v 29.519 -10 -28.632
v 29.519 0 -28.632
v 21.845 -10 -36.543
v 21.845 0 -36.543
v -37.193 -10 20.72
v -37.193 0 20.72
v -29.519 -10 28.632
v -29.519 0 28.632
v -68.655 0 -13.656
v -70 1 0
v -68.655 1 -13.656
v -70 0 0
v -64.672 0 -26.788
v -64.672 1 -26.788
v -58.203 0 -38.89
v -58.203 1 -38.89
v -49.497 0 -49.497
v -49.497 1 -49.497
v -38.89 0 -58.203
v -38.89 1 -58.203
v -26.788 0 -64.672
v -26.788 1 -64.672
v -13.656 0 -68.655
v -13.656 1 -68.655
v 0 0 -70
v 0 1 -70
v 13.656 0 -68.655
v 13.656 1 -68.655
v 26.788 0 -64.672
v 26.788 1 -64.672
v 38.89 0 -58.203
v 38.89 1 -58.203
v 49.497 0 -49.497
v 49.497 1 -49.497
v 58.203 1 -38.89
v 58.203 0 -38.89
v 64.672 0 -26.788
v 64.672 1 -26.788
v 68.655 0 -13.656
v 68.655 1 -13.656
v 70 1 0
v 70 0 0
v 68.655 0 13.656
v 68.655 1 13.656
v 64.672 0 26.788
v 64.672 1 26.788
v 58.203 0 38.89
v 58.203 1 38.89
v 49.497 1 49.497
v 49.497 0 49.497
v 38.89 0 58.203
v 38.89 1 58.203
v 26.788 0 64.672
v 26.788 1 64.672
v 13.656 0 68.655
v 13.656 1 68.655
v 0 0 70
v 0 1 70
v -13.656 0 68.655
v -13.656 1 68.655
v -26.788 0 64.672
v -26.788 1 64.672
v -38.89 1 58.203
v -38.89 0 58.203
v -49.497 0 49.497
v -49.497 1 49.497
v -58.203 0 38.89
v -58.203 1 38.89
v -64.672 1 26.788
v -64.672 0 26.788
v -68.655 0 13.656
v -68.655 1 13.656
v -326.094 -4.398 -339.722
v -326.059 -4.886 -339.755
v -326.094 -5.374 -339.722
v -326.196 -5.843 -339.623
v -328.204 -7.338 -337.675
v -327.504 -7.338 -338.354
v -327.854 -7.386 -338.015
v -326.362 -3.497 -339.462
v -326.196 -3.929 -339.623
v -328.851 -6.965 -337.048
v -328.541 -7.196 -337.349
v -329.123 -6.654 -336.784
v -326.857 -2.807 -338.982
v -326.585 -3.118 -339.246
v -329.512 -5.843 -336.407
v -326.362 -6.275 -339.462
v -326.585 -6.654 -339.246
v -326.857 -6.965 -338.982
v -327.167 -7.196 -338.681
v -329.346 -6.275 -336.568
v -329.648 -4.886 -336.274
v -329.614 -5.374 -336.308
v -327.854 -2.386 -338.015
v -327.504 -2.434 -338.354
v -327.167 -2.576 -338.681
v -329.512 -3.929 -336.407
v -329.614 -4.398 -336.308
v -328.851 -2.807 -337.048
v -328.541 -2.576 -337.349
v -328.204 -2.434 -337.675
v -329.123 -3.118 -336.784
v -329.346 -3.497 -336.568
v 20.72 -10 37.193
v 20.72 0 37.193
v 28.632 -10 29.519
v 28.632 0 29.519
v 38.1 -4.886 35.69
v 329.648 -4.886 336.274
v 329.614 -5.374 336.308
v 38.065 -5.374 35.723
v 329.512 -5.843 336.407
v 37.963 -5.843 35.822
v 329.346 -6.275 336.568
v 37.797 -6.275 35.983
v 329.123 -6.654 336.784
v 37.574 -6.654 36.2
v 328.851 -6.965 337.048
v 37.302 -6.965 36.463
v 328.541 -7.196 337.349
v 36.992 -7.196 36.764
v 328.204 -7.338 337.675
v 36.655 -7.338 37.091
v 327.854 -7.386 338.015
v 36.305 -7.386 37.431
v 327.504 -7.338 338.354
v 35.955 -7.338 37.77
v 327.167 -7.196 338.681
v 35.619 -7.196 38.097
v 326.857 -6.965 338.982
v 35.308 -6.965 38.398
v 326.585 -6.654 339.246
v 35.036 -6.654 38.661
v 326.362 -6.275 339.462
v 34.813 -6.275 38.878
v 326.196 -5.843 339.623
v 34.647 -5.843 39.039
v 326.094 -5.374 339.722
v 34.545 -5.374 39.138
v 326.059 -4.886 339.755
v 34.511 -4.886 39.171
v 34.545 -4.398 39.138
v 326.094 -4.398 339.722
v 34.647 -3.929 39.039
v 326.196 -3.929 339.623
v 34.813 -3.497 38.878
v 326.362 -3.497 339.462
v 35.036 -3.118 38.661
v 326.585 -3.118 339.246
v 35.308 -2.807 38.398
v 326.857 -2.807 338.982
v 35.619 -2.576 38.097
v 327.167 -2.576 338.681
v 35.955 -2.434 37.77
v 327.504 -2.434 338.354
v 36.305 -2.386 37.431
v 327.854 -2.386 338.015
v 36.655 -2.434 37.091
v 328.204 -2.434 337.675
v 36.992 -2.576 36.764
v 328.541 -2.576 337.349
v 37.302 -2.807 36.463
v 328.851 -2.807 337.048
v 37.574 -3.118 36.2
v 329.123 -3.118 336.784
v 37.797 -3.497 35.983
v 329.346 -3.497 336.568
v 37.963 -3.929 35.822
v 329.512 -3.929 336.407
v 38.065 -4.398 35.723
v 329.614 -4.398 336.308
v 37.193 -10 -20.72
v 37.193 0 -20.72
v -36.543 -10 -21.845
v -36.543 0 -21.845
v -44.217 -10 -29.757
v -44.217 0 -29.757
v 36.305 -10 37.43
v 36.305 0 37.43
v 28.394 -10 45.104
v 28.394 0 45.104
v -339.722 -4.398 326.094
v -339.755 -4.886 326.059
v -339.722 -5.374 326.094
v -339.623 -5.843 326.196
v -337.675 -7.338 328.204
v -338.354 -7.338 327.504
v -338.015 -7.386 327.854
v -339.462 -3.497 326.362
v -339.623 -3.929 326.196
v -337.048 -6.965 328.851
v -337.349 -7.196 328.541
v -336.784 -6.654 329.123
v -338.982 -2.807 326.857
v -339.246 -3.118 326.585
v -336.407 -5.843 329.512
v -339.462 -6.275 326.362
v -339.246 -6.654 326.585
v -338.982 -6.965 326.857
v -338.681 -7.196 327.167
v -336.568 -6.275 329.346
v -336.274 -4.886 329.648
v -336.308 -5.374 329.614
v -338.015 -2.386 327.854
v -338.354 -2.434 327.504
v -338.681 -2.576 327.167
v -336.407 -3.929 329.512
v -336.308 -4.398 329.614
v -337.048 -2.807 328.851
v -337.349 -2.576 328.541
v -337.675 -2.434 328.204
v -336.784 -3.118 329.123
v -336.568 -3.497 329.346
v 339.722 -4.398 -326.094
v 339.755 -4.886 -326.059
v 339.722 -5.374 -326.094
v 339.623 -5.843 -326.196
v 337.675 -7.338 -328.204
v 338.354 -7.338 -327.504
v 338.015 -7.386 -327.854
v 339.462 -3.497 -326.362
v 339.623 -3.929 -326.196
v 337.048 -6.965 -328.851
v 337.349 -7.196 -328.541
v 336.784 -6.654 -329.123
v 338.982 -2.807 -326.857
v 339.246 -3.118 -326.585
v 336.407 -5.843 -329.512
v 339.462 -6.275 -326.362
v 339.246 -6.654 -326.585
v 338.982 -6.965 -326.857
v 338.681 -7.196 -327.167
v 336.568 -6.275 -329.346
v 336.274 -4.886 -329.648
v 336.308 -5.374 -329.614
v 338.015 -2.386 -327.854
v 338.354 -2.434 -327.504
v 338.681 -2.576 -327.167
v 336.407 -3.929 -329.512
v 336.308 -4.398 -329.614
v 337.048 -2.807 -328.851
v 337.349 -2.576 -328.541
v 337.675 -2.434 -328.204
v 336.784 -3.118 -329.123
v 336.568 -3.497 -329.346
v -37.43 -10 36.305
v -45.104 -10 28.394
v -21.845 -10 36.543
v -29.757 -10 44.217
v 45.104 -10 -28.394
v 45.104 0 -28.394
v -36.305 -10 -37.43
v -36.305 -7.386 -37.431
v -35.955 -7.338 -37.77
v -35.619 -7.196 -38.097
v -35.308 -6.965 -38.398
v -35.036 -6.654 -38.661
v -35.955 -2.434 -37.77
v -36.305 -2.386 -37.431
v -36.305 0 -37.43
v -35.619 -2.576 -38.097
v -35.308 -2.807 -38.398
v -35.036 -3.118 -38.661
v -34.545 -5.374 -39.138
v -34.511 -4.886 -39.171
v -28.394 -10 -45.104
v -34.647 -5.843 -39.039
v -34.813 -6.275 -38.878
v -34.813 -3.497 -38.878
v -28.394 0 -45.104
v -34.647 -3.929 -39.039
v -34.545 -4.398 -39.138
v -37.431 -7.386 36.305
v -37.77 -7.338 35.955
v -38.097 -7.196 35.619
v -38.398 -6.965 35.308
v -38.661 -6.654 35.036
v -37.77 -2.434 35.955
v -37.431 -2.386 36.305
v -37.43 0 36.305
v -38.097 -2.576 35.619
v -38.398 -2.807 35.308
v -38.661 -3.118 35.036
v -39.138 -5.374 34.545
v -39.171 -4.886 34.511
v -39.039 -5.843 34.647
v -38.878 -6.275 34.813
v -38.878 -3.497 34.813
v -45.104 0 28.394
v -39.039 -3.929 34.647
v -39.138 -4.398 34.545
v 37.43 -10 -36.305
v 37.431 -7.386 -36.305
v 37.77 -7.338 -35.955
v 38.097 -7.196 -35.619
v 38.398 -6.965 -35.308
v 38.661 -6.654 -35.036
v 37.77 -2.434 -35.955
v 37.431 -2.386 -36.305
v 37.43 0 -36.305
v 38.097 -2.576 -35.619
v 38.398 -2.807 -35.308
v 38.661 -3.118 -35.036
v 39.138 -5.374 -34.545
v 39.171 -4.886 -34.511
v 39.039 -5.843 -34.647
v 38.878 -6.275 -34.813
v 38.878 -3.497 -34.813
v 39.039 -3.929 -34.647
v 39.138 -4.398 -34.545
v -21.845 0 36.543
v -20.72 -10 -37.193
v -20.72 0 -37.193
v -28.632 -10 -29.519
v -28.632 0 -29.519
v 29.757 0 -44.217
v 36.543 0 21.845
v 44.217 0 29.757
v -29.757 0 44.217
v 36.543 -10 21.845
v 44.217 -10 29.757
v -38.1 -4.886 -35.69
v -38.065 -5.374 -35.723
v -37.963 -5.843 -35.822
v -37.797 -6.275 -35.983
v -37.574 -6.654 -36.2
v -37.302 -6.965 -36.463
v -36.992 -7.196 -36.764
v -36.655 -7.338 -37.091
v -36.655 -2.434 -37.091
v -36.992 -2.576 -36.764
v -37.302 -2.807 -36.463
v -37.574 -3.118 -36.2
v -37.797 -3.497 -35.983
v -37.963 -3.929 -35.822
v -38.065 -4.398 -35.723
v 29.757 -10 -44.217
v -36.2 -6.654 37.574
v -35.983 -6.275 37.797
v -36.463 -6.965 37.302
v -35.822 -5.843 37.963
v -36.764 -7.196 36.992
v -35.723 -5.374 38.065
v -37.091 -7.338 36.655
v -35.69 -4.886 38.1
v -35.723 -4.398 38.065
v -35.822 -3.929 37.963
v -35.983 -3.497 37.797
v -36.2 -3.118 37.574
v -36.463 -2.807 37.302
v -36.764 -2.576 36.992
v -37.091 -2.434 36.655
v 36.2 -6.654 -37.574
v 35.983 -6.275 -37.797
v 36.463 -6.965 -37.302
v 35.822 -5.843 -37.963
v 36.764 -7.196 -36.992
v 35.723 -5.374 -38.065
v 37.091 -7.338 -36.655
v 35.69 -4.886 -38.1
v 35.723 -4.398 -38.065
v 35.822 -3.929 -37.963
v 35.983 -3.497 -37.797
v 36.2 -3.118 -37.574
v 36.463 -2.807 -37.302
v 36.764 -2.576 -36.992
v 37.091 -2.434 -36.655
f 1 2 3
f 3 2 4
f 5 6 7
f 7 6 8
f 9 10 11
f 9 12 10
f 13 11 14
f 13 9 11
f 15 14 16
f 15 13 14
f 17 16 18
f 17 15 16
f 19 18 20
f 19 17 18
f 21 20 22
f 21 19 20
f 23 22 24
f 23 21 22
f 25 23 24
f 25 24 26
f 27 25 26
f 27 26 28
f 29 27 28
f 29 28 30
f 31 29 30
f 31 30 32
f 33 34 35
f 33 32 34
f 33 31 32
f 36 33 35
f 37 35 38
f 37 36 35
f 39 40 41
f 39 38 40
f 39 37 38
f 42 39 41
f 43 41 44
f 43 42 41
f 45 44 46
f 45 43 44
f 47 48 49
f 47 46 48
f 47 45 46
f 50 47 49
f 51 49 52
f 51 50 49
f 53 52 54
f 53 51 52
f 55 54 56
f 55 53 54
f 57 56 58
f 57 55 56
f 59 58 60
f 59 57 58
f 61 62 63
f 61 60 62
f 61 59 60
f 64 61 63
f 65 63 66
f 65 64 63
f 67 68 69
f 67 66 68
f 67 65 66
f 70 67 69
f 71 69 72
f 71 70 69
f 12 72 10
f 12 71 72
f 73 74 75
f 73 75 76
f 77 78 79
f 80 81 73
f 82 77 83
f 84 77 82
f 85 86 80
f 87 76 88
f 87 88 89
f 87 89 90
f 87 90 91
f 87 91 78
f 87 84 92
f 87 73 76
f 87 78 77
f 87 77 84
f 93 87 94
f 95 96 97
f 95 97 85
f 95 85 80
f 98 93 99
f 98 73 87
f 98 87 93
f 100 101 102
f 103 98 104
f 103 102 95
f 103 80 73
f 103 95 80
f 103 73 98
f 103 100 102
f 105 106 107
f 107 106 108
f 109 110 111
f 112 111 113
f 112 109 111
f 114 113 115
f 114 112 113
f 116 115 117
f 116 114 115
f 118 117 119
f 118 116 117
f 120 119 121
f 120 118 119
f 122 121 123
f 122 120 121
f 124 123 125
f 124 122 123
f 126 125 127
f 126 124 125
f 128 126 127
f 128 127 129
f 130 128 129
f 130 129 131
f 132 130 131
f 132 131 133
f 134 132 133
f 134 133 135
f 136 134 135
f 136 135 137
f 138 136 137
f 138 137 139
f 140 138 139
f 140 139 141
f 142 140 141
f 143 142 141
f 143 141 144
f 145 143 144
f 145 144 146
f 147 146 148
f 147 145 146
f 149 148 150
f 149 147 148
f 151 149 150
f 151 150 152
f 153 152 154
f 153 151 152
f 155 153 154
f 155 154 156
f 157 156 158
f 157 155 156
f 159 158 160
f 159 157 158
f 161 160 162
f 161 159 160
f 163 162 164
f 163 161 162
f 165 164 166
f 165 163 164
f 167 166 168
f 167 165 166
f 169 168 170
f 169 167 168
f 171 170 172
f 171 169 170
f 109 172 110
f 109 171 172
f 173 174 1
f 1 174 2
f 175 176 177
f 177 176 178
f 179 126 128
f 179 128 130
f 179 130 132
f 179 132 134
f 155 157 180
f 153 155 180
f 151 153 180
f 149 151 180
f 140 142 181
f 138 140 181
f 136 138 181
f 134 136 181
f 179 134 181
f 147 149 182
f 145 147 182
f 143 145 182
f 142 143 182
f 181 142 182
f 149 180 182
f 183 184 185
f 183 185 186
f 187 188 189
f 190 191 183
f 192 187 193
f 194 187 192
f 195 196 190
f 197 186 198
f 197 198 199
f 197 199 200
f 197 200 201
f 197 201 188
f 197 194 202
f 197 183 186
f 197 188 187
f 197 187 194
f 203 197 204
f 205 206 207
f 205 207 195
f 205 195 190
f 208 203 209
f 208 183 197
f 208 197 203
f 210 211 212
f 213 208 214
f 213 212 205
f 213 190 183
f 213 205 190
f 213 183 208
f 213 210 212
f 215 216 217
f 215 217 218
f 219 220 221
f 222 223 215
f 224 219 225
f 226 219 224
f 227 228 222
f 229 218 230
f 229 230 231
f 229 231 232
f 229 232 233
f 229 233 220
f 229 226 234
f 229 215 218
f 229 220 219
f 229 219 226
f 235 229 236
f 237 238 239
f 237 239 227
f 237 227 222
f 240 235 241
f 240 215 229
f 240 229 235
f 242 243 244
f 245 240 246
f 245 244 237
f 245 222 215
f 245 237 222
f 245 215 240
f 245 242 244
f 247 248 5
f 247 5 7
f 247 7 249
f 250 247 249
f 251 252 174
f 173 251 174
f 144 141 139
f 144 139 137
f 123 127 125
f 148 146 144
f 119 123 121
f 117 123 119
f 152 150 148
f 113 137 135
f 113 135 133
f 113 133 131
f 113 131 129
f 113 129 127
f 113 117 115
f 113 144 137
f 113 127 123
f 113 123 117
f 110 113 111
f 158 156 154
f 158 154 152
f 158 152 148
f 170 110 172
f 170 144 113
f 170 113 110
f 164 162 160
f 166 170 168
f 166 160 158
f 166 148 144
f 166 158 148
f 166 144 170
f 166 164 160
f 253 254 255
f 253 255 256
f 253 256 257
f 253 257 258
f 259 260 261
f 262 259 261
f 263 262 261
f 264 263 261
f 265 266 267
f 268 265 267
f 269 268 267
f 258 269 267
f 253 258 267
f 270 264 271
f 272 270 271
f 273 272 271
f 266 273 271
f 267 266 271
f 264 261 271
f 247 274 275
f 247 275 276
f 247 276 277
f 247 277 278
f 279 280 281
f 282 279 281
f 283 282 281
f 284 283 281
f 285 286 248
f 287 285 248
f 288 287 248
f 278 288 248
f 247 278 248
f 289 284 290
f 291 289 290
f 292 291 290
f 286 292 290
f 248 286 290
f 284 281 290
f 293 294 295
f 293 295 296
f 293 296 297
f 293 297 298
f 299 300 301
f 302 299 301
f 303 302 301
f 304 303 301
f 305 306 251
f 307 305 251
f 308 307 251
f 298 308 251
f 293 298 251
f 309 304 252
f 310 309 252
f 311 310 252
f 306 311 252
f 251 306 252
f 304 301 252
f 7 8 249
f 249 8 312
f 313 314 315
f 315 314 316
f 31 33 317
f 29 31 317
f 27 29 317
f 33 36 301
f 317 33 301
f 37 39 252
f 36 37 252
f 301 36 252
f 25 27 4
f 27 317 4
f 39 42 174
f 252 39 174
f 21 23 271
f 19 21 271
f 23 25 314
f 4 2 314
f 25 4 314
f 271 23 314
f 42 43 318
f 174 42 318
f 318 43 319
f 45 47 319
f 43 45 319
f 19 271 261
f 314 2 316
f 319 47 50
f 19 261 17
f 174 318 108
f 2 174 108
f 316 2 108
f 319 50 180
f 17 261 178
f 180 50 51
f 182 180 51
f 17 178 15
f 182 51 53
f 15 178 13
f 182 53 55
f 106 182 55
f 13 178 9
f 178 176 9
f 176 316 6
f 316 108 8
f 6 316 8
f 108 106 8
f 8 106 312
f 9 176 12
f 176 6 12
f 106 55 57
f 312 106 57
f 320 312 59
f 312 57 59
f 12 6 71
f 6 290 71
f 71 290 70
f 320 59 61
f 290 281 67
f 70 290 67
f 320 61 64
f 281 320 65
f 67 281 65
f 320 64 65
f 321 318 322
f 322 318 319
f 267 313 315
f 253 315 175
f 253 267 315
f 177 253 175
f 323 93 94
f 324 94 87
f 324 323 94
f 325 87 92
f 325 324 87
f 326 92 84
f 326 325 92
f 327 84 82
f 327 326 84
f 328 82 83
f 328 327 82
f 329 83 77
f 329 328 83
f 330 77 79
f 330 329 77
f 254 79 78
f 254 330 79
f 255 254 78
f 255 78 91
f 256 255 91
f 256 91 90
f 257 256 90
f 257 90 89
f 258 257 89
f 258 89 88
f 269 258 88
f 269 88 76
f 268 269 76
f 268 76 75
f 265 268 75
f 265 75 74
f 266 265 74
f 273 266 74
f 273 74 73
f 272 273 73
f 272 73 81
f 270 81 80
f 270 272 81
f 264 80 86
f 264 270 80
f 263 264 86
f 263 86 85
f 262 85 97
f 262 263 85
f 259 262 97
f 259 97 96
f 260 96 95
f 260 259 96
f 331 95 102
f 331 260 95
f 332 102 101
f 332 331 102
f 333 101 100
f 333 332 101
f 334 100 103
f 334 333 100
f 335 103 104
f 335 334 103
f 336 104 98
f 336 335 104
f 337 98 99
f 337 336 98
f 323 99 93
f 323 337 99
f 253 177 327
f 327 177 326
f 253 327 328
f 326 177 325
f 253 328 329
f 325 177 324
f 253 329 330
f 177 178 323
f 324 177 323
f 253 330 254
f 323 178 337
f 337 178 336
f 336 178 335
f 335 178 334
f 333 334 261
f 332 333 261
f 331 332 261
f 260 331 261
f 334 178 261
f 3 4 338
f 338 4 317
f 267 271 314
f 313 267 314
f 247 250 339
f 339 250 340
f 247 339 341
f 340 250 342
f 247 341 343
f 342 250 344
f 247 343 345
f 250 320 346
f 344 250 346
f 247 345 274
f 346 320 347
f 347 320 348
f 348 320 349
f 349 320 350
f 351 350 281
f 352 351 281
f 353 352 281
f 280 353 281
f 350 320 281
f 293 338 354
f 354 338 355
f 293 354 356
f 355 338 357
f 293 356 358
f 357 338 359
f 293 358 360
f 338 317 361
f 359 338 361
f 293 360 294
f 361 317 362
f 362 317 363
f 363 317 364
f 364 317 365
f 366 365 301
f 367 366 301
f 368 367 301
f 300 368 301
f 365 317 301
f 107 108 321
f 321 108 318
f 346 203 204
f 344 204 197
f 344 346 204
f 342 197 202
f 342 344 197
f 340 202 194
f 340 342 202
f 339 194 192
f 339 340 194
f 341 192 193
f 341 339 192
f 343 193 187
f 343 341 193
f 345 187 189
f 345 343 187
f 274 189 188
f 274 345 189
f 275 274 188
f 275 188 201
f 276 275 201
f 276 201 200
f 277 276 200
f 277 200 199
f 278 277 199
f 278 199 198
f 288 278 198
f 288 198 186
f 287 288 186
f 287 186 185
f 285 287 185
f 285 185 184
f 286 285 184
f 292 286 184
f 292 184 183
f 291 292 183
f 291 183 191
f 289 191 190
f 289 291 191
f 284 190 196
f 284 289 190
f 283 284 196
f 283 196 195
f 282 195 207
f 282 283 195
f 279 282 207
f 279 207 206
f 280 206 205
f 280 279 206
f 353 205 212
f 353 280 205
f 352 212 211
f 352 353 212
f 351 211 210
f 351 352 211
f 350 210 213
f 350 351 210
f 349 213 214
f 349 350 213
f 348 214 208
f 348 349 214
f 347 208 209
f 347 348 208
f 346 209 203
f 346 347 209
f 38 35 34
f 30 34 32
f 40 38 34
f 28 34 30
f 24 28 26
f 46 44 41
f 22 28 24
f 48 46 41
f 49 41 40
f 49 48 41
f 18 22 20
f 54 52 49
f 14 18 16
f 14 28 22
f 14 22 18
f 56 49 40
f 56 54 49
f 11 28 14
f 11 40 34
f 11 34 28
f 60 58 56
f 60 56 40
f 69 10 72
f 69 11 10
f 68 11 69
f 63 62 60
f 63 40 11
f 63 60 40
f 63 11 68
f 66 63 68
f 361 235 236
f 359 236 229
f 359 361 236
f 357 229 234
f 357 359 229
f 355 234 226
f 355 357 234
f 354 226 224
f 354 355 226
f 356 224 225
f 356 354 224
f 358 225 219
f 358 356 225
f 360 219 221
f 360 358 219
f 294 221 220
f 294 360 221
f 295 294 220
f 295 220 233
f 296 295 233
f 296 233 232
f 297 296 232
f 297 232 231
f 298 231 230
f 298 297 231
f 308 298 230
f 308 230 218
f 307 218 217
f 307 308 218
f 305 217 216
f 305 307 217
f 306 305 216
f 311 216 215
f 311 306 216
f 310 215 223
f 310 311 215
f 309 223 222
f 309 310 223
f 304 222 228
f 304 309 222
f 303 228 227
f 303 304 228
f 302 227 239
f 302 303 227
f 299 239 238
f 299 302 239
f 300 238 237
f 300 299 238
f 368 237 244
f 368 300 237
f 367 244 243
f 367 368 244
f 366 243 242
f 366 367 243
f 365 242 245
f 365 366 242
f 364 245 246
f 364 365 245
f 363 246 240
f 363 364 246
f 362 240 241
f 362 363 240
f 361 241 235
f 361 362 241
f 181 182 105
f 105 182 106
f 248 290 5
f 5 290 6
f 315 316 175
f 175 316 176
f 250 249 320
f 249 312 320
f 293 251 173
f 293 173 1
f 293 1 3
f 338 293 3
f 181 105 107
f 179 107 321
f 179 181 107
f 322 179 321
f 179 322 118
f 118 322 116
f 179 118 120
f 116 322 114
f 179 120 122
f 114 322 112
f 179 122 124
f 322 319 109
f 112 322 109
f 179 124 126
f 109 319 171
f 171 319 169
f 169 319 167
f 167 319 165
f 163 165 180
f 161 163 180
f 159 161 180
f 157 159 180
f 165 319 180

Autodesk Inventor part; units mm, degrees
ref_plane "YZ Plane" through (0, 0, 0) normal (1, 0, 0) x (0, 1, 0)
ref_plane "XZ Plane" through (0, 0, 0) normal (0, 1, 0) x (-1, 0, 0)
ref_plane "XY Plane" through (0, 0, 0) normal (0, 0, 1) x (1, 0, 0)
sketch "Sketch1" plane through (0, 0, 0) normal (0, 1, 0) x (-1, 0, 0)
  circle A0 centre (0, 0) radius 70
  dimension "d0" = 140
extrude "Extrusion1" add sketch "Sketch1" along normal blind 1
sketch "Sketch2" plane through (0, 0, 0) normal (0, -1, 0) x (1, 0, 0)
  line L0 (0, 0) -> (36.3053, 37.4305)
  line L1 (36.3053, 37.4305) -> (28.3938, 45.1042)
  line L2 (28.3938, 45.1042) -> (20.7201, 37.1927)
  line L3 (20.7201, 37.1927) -> (28.6316, 29.519)
  line L4 (36.5432, 21.8453) -> (44.2169, 29.7568)
  line L5 (44.2169, 29.7568) -> (36.3053, 37.4305)
  line L6 (28.6316, 29.519) -> (36.5432, 21.8453)
extrude "Extrusion2" add sketch "Sketch2" along normal blind 10
sketch "Sketch3" plane through (28.3938, -10, 45.1042) normal (0.6962355, 0, 0.7178134) x (0.7178134, 0, -0.6962355)
  circle A0 centre (11.0217, 5.114) radius 2.5
  point P0 (11.0217, 10)
  dimension "d5" = 5
extrude "Extrusion3" add sketch "Sketch3" along normal blind 418.75
pattern_circular "Circular Pattern1" count 4 over 360 about axis through (0, 0, 0) along (0, 1, 0) of "Extrusion2", "Extrusion3"
properties part number "Spinning Platform"
